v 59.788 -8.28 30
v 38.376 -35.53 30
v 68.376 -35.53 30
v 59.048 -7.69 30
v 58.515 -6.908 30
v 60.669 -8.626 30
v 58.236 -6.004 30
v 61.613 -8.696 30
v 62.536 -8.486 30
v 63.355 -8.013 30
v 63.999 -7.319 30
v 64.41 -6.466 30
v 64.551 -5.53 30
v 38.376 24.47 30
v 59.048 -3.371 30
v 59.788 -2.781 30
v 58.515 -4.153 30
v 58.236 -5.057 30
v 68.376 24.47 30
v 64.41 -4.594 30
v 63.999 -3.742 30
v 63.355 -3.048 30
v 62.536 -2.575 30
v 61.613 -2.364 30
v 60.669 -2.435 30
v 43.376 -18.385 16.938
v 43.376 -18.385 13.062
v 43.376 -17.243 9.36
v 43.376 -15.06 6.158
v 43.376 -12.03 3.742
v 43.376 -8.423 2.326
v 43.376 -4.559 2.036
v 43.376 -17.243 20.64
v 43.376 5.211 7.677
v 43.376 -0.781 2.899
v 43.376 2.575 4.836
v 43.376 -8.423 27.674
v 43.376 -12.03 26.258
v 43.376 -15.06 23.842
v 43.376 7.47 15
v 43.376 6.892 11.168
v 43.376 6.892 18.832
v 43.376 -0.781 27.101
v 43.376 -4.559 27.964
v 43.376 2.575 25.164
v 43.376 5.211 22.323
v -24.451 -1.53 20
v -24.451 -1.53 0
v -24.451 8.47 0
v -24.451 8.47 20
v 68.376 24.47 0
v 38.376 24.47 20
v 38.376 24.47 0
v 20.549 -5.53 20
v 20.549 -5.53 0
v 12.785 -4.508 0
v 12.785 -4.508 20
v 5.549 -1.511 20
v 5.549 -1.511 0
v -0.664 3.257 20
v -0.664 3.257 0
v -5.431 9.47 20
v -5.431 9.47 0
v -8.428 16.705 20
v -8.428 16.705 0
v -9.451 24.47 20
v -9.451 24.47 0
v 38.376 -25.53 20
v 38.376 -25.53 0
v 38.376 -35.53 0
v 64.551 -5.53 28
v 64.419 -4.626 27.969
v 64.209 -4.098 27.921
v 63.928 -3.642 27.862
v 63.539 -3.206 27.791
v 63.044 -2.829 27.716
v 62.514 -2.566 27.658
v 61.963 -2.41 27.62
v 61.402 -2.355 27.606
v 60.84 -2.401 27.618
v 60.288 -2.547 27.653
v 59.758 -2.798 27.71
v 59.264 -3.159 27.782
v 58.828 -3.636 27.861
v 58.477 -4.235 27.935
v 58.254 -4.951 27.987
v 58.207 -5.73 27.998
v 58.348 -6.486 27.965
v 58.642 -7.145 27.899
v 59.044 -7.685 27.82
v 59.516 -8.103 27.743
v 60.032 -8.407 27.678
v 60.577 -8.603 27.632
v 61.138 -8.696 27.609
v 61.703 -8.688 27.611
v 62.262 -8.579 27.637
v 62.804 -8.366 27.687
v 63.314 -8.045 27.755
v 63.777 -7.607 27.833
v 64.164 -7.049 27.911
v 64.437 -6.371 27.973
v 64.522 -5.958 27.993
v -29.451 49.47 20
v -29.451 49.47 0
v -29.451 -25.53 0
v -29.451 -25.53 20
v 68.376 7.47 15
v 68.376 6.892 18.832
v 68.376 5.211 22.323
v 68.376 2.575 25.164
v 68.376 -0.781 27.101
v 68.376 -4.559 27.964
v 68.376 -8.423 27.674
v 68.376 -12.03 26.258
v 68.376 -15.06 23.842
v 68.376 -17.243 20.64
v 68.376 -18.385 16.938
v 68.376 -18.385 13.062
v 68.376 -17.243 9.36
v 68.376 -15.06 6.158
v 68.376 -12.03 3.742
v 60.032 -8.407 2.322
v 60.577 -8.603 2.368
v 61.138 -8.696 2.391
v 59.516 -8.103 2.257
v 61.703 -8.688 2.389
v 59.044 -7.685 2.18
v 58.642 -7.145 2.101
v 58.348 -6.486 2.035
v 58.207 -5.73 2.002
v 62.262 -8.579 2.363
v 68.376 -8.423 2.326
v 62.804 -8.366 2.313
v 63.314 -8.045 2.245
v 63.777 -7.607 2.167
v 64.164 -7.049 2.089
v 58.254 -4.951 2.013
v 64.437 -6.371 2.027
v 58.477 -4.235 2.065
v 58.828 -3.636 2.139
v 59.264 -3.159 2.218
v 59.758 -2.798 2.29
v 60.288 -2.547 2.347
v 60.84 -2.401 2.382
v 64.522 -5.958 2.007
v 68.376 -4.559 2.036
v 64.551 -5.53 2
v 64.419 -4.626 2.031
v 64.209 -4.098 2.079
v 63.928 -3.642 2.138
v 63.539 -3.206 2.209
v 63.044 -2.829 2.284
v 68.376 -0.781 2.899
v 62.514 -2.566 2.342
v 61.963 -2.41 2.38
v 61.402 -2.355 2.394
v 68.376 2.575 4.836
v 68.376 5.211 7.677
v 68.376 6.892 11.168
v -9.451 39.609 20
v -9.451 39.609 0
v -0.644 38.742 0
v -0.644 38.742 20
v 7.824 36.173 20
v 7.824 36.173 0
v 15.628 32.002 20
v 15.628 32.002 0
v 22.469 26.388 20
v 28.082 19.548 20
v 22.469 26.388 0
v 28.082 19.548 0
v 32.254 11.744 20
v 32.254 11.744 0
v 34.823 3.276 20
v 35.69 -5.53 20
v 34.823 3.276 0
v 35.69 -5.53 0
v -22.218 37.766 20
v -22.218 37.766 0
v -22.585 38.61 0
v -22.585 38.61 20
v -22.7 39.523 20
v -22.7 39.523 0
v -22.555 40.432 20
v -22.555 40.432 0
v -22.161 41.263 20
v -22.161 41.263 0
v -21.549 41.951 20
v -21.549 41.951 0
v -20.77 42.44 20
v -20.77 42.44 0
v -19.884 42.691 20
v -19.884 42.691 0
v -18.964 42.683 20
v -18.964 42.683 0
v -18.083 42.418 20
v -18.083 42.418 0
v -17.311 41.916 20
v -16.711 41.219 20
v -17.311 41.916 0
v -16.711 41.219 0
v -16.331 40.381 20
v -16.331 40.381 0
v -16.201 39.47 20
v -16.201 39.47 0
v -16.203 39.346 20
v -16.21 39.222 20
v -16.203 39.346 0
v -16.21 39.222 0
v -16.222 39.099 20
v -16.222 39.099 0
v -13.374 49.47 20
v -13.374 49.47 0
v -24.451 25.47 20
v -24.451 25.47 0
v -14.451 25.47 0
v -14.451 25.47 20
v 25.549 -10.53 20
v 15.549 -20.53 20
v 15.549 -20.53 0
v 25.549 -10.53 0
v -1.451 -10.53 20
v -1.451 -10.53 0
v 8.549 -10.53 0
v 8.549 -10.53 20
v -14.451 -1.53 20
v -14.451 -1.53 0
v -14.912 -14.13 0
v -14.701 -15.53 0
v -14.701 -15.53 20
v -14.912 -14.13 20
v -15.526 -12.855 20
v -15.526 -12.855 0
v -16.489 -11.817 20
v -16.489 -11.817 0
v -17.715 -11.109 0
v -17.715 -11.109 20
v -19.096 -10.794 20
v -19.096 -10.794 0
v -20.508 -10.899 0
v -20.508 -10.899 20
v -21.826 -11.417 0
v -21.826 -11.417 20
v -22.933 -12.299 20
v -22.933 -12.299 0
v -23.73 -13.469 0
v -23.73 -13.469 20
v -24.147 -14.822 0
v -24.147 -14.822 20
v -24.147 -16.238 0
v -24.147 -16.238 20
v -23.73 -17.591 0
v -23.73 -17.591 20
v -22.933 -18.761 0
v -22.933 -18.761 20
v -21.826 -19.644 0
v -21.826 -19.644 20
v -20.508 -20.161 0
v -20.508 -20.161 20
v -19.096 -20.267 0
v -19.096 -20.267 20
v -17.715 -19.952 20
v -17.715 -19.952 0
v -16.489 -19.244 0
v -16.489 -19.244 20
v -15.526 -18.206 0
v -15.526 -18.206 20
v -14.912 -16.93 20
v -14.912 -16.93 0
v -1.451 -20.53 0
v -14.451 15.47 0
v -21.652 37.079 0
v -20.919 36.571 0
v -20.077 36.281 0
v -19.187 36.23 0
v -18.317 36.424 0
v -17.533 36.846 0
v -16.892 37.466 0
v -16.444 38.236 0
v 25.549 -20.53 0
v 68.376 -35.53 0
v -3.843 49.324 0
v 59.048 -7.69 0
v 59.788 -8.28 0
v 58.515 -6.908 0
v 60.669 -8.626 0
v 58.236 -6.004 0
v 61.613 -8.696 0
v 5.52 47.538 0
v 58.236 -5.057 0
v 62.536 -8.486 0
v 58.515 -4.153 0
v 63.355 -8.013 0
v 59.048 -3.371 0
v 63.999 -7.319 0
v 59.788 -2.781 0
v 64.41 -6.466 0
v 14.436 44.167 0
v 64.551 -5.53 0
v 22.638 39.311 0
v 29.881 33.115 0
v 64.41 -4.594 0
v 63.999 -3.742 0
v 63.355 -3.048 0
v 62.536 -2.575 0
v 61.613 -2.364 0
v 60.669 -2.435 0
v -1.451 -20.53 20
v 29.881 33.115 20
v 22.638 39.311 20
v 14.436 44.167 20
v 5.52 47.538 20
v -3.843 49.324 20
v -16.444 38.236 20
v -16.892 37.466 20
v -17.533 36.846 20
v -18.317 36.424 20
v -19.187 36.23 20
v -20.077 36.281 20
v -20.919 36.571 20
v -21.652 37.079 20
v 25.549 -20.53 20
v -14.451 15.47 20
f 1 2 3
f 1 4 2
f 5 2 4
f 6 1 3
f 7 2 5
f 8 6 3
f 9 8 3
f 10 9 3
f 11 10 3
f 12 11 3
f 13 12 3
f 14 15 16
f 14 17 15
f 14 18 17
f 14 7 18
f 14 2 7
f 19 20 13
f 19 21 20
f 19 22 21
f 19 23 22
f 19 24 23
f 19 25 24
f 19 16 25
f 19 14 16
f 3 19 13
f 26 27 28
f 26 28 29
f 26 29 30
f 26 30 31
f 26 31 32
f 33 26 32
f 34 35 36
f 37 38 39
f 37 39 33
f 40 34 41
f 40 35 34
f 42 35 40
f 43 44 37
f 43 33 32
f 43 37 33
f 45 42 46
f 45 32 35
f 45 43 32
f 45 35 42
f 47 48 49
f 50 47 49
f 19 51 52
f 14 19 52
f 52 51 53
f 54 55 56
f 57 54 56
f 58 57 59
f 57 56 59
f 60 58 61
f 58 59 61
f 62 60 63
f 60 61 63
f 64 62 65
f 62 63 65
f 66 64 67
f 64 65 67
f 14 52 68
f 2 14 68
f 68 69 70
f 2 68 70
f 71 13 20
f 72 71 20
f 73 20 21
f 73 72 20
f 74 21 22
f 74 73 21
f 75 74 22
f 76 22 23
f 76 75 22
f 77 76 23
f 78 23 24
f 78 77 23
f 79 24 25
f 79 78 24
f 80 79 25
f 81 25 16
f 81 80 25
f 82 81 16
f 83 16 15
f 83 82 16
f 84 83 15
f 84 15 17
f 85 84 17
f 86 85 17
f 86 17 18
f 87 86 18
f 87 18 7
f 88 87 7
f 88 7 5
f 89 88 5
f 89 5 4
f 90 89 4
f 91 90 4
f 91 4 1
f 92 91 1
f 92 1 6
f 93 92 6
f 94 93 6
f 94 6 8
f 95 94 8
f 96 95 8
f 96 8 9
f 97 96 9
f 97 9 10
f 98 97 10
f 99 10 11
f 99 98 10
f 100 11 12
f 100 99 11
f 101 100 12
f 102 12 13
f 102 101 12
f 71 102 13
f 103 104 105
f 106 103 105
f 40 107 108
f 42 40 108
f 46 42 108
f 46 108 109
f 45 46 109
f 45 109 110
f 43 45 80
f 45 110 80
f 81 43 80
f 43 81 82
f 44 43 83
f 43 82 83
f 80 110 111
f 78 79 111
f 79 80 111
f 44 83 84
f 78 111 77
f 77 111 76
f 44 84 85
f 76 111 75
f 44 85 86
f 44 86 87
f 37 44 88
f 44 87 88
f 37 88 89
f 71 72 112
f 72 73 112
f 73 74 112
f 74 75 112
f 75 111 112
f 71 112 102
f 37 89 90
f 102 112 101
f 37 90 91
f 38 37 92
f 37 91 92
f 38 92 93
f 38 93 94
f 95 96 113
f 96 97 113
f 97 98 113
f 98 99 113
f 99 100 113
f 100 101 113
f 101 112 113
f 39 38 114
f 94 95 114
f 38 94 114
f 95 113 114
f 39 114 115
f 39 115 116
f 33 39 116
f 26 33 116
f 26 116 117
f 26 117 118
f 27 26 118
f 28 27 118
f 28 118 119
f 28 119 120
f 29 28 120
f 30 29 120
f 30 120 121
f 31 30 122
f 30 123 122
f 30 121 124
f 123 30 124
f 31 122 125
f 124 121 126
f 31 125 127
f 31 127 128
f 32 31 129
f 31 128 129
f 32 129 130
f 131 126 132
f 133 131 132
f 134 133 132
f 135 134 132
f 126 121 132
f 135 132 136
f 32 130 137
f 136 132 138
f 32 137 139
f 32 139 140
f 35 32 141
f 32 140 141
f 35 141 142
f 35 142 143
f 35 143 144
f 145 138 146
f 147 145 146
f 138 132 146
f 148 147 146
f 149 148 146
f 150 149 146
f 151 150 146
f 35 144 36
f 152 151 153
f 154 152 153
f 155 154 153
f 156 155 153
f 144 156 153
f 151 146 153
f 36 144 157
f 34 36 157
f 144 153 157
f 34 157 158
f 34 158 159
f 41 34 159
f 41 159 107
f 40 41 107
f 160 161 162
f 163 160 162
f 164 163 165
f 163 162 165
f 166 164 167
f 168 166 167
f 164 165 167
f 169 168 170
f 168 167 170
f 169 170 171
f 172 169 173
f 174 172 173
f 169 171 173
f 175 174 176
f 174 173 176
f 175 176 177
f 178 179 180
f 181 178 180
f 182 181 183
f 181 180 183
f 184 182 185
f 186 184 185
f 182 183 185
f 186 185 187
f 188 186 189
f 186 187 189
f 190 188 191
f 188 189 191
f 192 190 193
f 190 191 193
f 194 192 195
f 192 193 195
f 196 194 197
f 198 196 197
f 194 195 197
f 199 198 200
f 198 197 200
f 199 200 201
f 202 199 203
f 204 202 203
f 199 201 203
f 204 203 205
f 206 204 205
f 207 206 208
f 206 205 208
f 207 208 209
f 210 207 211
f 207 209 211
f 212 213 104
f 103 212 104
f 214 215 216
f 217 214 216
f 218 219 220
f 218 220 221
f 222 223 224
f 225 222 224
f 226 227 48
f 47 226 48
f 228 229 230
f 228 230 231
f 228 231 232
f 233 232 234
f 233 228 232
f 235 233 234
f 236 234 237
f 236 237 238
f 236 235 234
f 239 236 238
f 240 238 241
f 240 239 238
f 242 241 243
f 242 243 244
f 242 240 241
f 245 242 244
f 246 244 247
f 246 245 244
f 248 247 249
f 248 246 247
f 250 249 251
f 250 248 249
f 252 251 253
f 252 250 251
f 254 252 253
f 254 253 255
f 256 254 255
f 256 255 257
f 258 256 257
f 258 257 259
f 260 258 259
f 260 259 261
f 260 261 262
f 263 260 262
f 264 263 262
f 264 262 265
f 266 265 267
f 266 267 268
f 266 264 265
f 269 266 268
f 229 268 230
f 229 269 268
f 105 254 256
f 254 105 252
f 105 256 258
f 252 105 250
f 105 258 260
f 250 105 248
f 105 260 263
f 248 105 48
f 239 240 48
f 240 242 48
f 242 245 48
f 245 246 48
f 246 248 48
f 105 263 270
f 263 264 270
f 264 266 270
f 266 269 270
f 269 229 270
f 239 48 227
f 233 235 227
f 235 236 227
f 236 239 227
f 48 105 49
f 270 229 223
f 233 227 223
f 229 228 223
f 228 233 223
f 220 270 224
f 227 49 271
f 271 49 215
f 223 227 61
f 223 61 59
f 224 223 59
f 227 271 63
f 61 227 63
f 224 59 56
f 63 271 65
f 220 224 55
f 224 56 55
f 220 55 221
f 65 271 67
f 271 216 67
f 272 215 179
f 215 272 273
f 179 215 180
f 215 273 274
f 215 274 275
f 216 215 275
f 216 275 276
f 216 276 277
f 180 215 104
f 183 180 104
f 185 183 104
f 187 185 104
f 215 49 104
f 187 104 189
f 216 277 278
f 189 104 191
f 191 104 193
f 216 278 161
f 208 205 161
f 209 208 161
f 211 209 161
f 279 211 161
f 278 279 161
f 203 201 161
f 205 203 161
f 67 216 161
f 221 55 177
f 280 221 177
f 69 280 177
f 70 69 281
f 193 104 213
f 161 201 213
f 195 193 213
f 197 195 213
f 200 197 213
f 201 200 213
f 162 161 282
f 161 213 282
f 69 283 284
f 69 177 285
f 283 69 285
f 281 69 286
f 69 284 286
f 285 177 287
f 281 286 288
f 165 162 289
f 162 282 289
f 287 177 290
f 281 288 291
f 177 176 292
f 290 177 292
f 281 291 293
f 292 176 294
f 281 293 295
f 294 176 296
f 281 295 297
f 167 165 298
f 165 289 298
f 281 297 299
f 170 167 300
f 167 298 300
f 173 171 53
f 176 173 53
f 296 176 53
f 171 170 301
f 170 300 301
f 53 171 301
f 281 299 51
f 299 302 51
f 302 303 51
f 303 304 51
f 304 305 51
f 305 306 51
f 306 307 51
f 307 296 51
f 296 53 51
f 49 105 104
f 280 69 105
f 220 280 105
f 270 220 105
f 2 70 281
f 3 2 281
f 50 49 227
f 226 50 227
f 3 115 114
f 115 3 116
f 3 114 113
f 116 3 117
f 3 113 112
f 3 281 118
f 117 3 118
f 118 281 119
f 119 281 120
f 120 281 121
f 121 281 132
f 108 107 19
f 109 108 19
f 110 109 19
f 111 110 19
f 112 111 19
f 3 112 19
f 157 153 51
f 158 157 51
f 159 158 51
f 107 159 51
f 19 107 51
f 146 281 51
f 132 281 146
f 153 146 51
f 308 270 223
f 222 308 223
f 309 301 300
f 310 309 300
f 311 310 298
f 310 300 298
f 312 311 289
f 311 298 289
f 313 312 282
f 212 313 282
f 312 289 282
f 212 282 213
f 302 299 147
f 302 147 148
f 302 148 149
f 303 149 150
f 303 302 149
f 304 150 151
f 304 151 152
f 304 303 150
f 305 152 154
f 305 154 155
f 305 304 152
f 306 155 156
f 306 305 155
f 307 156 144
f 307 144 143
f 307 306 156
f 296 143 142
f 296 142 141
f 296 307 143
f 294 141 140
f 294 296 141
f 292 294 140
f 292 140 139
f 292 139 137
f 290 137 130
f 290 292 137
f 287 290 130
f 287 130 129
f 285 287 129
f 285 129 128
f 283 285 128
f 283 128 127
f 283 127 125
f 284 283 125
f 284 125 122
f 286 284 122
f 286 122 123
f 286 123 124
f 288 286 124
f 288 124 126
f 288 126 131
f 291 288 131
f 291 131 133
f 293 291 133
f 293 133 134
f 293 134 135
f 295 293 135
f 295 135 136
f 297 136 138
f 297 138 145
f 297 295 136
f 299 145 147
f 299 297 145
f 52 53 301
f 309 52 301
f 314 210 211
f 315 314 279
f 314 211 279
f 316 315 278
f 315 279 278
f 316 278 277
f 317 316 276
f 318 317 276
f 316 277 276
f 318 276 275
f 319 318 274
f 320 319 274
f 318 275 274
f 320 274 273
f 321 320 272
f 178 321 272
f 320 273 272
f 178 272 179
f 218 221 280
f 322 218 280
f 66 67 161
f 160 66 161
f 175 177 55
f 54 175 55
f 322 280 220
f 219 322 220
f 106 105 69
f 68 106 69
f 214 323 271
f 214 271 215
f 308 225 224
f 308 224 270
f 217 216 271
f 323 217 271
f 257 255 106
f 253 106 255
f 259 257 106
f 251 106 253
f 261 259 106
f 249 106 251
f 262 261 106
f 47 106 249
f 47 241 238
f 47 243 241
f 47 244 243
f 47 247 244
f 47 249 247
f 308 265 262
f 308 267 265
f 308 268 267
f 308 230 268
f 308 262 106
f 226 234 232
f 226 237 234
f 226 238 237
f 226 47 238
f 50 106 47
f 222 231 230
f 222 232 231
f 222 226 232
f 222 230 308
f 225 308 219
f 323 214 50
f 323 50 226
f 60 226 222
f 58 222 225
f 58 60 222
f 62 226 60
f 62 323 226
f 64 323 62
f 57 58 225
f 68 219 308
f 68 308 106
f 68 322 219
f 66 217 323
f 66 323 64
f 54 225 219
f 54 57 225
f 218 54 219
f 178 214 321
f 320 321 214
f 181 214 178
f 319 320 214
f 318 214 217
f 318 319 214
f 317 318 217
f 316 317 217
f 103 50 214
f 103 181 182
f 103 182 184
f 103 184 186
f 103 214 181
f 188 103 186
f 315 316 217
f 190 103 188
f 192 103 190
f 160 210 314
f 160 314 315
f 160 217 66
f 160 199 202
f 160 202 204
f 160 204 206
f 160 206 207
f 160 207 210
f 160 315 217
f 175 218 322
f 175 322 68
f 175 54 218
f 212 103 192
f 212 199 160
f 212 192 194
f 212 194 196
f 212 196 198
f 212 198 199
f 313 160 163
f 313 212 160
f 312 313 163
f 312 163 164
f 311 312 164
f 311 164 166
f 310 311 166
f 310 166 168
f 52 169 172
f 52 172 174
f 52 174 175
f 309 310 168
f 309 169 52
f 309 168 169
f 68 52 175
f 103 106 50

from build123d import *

# Parameters (mm, degrees)
F0_R     = 3.175
F0_R_2   = 4.75
F1_DEPTH = 20
F2_DEPTH = 30
F3_R     = 13
F4_DEPTH = 25


with BuildPart() as f1:
    # F0 (on Top) → F1 (new body)
    with BuildSketch(Plane.XY):
        with BuildLine():
            ThreePointArc((45.6904160883, -5.5314753587), (43.8303978971, -19.7324153288), (38.3758278236, -32.9753013065))
            Line((38.3758278236, -32.9753013065), (38.3758278236, -35.5302935839))
            Line((38.3758278236, -35.5302935839), (68.3758278236, -35.5302935839))
            Line((68.3758278236, -35.5302935839), (68.3758278236, 24.4697064161))
            Line((68.3758278236, 24.4697064161), (38.3758278236, 24.4697064161))
            Line((38.3758278236, 24.4697064161), (38.3758278236, 21.9123505891))
            ThreePointArc((38.3758278236, 21.9123505891), (43.8303978971, 8.6694646114), (45.6904160883, -5.5314753587))
        make_face()
        with Locations((61.3758278236, -5.5302935839)):
            Circle(F0_R, mode=Mode.SUBTRACT)
        with BuildLine():
            ThreePointArc((35.6904160883, -5.5314753587), (34.5069545017, -15.8000971879), (31.0186234261, -25.5302935839))
            Line((31.0186234261, -25.5302935839), (38.3758278236, -25.5302935839))
            Line((38.3758278236, -25.5302935839), (38.3758278236, -5.5302935839))
            Line((38.3758278236, -5.5302935839), (35.6904160728, -5.5302935839))
            ThreePointArc((35.6904160728, -5.5302935839), (35.6904160844, -5.5308844713), (35.6904160883, -5.5314753587))
        make_face()
        with BuildLine():
            ThreePointArc((-22.2183206005, 37.7662119119), (-25.8953821372, 36.5074722173), (-29.4505405381, 34.937104137))
            Line((-29.4505405381, 34.937104137), (-29.4505405381, -25.5302935839))
            Line((-29.4505405381, -25.5302935839), (-9.4505405381, -25.5302935839))
            Line((-9.4505405381, -25.5302935839), (31.0186234261, -25.5302935839))
            ThreePointArc((31.0186234261, -25.5302935839), (34.5069545017, -15.8000971879), (35.6904160883, -5.5314753587))
            ThreePointArc((35.6904160883, -5.5314753587), (35.6904160844, -5.5308844713), (35.6904160728, -5.5302935839))
            Line((35.6904160728, -5.5302935839), (20.5494594619, -5.5302935839))
            ThreePointArc((20.5494594619, -5.5302935839), (-0.6637439737, 3.2565029805), (-9.4505405381, 24.4697064161))
            Line((-9.4505405381, 24.4697064161), (-9.4505405381, 39.6094809703))
            ThreePointArc((-9.4505405381, 39.6094809703), (-12.8457783614, 39.4816149196), (-16.2217815185, 39.0987411975))
            ThreePointArc((-16.2217815185, 39.0987411975), (-18.7455341736, 36.2970945543), (-22.2183206005, 37.7662119119))
        make_face()
        with Locations((-19.4505405381, -15.5302935839)):
            Circle(F0_R_2, mode=Mode.SUBTRACT)
        Polygon((-1.4505405381, -10.5302935839), (8.5494594619, -10.5302935839), (-1.4505405381, -20.5302935839), align=None, mode=Mode.SUBTRACT)
        Polygon((25.5494594619, -20.5302935839), (15.5494594619, -20.5302935839), (25.5494594619, -10.5302935839), align=None, mode=Mode.SUBTRACT)
        Polygon((-24.4505405381, -1.5302935839), (-24.4505405381, 8.4697064161), (-14.4505405381, -1.5302935839), align=None, mode=Mode.SUBTRACT)
        Polygon((-14.4505405381, 25.4697064161), (-14.4505405381, 15.4697064161), (-24.4505405381, 25.4697064161), align=None, mode=Mode.SUBTRACT)
        with BuildLine():
            Line((-9.4505405381, 49.4697064161), (-13.3741952012, 49.4697064161))
            ThreePointArc((-13.3741952012, 49.4697064161), (-21.5481694996, 48.2660378849), (-29.4505405381, 45.8545641168))
            Line((-29.4505405381, 45.8545641168), (-29.4505405381, 34.937104137))
            ThreePointArc((-29.4505405381, 34.937104137), (-25.8953821372, 36.5074722173), (-22.2183206005, 37.7662119119))
            ThreePointArc((-22.2183206005, 37.7662119119), (-20.3357565561, 42.5968285118), (-16.2005405381, 39.4697064161))
            ThreePointArc((-16.2005405381, 39.4697064161), (-16.2058551286, 39.283919998), (-16.2217815185, 39.0987411975))
            ThreePointArc((-16.2217815185, 39.0987411975), (-12.8457783614, 39.4816149196), (-9.4505405381, 39.6094809703))
            Line((-9.4505405381, 39.6094809703), (-9.4505405381, 49.4697064161))
        make_face()
        with BuildLine():
            ThreePointArc((29.8809127675, 33.1151528142), (10.0506365578, 46.0459341182), (-13.3741952012, 49.4697064161))
            Line((-13.3741952012, 49.4697064161), (-9.4505405381, 49.4697064161))
            Line((-9.4505405381, 49.4697064161), (-9.4505405381, 39.6094809703))
            ThreePointArc((-9.4505405381, 39.6094809703), (22.4685181604, 26.3884188937), (35.6904160728, -5.5302935839))
            Line((35.6904160728, -5.5302935839), (38.3758278236, -5.5302935839))
            Line((38.3758278236, -5.5302935839), (38.3758278236, 21.9123505891))
            ThreePointArc((38.3758278236, 21.9123505891), (34.4868827374, 27.7856062501), (29.8809127675, 33.1151528142))
        make_face()
        with BuildLine():
            Line((-13.3741952012, 49.4697064161), (-29.4505405381, 49.4697064161))
            Line((-29.4505405381, 49.4697064161), (-29.4505405381, 45.8545641168))
            ThreePointArc((-29.4505405381, 45.8545641168), (-21.5481694996, 48.2660378849), (-13.3741952012, 49.4697064161))
        make_face()
        with BuildLine():
            Line((38.3758278236, 24.4697064161), (29.8809127675, 33.1151528142))
            ThreePointArc((29.8809127675, 33.1151528142), (34.4868827374, 27.7856062501), (38.3758278236, 21.9123505891))
            Line((38.3758278236, 21.9123505891), (38.3758278236, 24.4697064161))
        make_face()
    extrude(amount=F1_DEPTH)

    # F0 (on Top) → F2 (join)
    with BuildSketch(Plane.XY):
        with BuildLine():
            Line((38.3758278236, -25.5302935839), (38.3758278236, -32.9753013065))
            ThreePointArc((38.3758278236, -32.9753013065), (43.8303978971, -19.7324153288), (45.6904160883, -5.5314753587))
            ThreePointArc((45.6904160883, -5.5314753587), (43.8303978971, 8.6694646114), (38.3758278236, 21.9123505891))
            Line((38.3758278236, 21.9123505891), (38.3758278236, -5.5302935839))
            Line((38.3758278236, -5.5302935839), (38.3758278236, -25.5302935839))
        make_face()
        with BuildLine():
            ThreePointArc((45.6904160883, -5.5314753587), (43.8303978971, -19.7324153288), (38.3758278236, -32.9753013065))
            Line((38.3758278236, -32.9753013065), (38.3758278236, -35.5302935839))
            Line((38.3758278236, -35.5302935839), (68.3758278236, -35.5302935839))
            Line((68.3758278236, -35.5302935839), (68.3758278236, 24.4697064161))
            Line((68.3758278236, 24.4697064161), (38.3758278236, 24.4697064161))
            Line((38.3758278236, 24.4697064161), (38.3758278236, 21.9123505891))
            ThreePointArc((38.3758278236, 21.9123505891), (43.8303978971, 8.6694646114), (45.6904160883, -5.5314753587))
        make_face()
        with Locations((61.3758278236, -5.5302935839)):
            Circle(F0_R, mode=Mode.SUBTRACT)
    extrude(amount=F2_DEPTH)

    # F3 (on face) → F4 (cut)
    with BuildSketch(Plane.YZ.offset(68.3758278236)):
        with Locations((-5.5302935839, 15)):
            Circle(F3_R)
    extrude(amount=-F4_DEPTH, mode=Mode.SUBTRACT)


solid = f1.part
